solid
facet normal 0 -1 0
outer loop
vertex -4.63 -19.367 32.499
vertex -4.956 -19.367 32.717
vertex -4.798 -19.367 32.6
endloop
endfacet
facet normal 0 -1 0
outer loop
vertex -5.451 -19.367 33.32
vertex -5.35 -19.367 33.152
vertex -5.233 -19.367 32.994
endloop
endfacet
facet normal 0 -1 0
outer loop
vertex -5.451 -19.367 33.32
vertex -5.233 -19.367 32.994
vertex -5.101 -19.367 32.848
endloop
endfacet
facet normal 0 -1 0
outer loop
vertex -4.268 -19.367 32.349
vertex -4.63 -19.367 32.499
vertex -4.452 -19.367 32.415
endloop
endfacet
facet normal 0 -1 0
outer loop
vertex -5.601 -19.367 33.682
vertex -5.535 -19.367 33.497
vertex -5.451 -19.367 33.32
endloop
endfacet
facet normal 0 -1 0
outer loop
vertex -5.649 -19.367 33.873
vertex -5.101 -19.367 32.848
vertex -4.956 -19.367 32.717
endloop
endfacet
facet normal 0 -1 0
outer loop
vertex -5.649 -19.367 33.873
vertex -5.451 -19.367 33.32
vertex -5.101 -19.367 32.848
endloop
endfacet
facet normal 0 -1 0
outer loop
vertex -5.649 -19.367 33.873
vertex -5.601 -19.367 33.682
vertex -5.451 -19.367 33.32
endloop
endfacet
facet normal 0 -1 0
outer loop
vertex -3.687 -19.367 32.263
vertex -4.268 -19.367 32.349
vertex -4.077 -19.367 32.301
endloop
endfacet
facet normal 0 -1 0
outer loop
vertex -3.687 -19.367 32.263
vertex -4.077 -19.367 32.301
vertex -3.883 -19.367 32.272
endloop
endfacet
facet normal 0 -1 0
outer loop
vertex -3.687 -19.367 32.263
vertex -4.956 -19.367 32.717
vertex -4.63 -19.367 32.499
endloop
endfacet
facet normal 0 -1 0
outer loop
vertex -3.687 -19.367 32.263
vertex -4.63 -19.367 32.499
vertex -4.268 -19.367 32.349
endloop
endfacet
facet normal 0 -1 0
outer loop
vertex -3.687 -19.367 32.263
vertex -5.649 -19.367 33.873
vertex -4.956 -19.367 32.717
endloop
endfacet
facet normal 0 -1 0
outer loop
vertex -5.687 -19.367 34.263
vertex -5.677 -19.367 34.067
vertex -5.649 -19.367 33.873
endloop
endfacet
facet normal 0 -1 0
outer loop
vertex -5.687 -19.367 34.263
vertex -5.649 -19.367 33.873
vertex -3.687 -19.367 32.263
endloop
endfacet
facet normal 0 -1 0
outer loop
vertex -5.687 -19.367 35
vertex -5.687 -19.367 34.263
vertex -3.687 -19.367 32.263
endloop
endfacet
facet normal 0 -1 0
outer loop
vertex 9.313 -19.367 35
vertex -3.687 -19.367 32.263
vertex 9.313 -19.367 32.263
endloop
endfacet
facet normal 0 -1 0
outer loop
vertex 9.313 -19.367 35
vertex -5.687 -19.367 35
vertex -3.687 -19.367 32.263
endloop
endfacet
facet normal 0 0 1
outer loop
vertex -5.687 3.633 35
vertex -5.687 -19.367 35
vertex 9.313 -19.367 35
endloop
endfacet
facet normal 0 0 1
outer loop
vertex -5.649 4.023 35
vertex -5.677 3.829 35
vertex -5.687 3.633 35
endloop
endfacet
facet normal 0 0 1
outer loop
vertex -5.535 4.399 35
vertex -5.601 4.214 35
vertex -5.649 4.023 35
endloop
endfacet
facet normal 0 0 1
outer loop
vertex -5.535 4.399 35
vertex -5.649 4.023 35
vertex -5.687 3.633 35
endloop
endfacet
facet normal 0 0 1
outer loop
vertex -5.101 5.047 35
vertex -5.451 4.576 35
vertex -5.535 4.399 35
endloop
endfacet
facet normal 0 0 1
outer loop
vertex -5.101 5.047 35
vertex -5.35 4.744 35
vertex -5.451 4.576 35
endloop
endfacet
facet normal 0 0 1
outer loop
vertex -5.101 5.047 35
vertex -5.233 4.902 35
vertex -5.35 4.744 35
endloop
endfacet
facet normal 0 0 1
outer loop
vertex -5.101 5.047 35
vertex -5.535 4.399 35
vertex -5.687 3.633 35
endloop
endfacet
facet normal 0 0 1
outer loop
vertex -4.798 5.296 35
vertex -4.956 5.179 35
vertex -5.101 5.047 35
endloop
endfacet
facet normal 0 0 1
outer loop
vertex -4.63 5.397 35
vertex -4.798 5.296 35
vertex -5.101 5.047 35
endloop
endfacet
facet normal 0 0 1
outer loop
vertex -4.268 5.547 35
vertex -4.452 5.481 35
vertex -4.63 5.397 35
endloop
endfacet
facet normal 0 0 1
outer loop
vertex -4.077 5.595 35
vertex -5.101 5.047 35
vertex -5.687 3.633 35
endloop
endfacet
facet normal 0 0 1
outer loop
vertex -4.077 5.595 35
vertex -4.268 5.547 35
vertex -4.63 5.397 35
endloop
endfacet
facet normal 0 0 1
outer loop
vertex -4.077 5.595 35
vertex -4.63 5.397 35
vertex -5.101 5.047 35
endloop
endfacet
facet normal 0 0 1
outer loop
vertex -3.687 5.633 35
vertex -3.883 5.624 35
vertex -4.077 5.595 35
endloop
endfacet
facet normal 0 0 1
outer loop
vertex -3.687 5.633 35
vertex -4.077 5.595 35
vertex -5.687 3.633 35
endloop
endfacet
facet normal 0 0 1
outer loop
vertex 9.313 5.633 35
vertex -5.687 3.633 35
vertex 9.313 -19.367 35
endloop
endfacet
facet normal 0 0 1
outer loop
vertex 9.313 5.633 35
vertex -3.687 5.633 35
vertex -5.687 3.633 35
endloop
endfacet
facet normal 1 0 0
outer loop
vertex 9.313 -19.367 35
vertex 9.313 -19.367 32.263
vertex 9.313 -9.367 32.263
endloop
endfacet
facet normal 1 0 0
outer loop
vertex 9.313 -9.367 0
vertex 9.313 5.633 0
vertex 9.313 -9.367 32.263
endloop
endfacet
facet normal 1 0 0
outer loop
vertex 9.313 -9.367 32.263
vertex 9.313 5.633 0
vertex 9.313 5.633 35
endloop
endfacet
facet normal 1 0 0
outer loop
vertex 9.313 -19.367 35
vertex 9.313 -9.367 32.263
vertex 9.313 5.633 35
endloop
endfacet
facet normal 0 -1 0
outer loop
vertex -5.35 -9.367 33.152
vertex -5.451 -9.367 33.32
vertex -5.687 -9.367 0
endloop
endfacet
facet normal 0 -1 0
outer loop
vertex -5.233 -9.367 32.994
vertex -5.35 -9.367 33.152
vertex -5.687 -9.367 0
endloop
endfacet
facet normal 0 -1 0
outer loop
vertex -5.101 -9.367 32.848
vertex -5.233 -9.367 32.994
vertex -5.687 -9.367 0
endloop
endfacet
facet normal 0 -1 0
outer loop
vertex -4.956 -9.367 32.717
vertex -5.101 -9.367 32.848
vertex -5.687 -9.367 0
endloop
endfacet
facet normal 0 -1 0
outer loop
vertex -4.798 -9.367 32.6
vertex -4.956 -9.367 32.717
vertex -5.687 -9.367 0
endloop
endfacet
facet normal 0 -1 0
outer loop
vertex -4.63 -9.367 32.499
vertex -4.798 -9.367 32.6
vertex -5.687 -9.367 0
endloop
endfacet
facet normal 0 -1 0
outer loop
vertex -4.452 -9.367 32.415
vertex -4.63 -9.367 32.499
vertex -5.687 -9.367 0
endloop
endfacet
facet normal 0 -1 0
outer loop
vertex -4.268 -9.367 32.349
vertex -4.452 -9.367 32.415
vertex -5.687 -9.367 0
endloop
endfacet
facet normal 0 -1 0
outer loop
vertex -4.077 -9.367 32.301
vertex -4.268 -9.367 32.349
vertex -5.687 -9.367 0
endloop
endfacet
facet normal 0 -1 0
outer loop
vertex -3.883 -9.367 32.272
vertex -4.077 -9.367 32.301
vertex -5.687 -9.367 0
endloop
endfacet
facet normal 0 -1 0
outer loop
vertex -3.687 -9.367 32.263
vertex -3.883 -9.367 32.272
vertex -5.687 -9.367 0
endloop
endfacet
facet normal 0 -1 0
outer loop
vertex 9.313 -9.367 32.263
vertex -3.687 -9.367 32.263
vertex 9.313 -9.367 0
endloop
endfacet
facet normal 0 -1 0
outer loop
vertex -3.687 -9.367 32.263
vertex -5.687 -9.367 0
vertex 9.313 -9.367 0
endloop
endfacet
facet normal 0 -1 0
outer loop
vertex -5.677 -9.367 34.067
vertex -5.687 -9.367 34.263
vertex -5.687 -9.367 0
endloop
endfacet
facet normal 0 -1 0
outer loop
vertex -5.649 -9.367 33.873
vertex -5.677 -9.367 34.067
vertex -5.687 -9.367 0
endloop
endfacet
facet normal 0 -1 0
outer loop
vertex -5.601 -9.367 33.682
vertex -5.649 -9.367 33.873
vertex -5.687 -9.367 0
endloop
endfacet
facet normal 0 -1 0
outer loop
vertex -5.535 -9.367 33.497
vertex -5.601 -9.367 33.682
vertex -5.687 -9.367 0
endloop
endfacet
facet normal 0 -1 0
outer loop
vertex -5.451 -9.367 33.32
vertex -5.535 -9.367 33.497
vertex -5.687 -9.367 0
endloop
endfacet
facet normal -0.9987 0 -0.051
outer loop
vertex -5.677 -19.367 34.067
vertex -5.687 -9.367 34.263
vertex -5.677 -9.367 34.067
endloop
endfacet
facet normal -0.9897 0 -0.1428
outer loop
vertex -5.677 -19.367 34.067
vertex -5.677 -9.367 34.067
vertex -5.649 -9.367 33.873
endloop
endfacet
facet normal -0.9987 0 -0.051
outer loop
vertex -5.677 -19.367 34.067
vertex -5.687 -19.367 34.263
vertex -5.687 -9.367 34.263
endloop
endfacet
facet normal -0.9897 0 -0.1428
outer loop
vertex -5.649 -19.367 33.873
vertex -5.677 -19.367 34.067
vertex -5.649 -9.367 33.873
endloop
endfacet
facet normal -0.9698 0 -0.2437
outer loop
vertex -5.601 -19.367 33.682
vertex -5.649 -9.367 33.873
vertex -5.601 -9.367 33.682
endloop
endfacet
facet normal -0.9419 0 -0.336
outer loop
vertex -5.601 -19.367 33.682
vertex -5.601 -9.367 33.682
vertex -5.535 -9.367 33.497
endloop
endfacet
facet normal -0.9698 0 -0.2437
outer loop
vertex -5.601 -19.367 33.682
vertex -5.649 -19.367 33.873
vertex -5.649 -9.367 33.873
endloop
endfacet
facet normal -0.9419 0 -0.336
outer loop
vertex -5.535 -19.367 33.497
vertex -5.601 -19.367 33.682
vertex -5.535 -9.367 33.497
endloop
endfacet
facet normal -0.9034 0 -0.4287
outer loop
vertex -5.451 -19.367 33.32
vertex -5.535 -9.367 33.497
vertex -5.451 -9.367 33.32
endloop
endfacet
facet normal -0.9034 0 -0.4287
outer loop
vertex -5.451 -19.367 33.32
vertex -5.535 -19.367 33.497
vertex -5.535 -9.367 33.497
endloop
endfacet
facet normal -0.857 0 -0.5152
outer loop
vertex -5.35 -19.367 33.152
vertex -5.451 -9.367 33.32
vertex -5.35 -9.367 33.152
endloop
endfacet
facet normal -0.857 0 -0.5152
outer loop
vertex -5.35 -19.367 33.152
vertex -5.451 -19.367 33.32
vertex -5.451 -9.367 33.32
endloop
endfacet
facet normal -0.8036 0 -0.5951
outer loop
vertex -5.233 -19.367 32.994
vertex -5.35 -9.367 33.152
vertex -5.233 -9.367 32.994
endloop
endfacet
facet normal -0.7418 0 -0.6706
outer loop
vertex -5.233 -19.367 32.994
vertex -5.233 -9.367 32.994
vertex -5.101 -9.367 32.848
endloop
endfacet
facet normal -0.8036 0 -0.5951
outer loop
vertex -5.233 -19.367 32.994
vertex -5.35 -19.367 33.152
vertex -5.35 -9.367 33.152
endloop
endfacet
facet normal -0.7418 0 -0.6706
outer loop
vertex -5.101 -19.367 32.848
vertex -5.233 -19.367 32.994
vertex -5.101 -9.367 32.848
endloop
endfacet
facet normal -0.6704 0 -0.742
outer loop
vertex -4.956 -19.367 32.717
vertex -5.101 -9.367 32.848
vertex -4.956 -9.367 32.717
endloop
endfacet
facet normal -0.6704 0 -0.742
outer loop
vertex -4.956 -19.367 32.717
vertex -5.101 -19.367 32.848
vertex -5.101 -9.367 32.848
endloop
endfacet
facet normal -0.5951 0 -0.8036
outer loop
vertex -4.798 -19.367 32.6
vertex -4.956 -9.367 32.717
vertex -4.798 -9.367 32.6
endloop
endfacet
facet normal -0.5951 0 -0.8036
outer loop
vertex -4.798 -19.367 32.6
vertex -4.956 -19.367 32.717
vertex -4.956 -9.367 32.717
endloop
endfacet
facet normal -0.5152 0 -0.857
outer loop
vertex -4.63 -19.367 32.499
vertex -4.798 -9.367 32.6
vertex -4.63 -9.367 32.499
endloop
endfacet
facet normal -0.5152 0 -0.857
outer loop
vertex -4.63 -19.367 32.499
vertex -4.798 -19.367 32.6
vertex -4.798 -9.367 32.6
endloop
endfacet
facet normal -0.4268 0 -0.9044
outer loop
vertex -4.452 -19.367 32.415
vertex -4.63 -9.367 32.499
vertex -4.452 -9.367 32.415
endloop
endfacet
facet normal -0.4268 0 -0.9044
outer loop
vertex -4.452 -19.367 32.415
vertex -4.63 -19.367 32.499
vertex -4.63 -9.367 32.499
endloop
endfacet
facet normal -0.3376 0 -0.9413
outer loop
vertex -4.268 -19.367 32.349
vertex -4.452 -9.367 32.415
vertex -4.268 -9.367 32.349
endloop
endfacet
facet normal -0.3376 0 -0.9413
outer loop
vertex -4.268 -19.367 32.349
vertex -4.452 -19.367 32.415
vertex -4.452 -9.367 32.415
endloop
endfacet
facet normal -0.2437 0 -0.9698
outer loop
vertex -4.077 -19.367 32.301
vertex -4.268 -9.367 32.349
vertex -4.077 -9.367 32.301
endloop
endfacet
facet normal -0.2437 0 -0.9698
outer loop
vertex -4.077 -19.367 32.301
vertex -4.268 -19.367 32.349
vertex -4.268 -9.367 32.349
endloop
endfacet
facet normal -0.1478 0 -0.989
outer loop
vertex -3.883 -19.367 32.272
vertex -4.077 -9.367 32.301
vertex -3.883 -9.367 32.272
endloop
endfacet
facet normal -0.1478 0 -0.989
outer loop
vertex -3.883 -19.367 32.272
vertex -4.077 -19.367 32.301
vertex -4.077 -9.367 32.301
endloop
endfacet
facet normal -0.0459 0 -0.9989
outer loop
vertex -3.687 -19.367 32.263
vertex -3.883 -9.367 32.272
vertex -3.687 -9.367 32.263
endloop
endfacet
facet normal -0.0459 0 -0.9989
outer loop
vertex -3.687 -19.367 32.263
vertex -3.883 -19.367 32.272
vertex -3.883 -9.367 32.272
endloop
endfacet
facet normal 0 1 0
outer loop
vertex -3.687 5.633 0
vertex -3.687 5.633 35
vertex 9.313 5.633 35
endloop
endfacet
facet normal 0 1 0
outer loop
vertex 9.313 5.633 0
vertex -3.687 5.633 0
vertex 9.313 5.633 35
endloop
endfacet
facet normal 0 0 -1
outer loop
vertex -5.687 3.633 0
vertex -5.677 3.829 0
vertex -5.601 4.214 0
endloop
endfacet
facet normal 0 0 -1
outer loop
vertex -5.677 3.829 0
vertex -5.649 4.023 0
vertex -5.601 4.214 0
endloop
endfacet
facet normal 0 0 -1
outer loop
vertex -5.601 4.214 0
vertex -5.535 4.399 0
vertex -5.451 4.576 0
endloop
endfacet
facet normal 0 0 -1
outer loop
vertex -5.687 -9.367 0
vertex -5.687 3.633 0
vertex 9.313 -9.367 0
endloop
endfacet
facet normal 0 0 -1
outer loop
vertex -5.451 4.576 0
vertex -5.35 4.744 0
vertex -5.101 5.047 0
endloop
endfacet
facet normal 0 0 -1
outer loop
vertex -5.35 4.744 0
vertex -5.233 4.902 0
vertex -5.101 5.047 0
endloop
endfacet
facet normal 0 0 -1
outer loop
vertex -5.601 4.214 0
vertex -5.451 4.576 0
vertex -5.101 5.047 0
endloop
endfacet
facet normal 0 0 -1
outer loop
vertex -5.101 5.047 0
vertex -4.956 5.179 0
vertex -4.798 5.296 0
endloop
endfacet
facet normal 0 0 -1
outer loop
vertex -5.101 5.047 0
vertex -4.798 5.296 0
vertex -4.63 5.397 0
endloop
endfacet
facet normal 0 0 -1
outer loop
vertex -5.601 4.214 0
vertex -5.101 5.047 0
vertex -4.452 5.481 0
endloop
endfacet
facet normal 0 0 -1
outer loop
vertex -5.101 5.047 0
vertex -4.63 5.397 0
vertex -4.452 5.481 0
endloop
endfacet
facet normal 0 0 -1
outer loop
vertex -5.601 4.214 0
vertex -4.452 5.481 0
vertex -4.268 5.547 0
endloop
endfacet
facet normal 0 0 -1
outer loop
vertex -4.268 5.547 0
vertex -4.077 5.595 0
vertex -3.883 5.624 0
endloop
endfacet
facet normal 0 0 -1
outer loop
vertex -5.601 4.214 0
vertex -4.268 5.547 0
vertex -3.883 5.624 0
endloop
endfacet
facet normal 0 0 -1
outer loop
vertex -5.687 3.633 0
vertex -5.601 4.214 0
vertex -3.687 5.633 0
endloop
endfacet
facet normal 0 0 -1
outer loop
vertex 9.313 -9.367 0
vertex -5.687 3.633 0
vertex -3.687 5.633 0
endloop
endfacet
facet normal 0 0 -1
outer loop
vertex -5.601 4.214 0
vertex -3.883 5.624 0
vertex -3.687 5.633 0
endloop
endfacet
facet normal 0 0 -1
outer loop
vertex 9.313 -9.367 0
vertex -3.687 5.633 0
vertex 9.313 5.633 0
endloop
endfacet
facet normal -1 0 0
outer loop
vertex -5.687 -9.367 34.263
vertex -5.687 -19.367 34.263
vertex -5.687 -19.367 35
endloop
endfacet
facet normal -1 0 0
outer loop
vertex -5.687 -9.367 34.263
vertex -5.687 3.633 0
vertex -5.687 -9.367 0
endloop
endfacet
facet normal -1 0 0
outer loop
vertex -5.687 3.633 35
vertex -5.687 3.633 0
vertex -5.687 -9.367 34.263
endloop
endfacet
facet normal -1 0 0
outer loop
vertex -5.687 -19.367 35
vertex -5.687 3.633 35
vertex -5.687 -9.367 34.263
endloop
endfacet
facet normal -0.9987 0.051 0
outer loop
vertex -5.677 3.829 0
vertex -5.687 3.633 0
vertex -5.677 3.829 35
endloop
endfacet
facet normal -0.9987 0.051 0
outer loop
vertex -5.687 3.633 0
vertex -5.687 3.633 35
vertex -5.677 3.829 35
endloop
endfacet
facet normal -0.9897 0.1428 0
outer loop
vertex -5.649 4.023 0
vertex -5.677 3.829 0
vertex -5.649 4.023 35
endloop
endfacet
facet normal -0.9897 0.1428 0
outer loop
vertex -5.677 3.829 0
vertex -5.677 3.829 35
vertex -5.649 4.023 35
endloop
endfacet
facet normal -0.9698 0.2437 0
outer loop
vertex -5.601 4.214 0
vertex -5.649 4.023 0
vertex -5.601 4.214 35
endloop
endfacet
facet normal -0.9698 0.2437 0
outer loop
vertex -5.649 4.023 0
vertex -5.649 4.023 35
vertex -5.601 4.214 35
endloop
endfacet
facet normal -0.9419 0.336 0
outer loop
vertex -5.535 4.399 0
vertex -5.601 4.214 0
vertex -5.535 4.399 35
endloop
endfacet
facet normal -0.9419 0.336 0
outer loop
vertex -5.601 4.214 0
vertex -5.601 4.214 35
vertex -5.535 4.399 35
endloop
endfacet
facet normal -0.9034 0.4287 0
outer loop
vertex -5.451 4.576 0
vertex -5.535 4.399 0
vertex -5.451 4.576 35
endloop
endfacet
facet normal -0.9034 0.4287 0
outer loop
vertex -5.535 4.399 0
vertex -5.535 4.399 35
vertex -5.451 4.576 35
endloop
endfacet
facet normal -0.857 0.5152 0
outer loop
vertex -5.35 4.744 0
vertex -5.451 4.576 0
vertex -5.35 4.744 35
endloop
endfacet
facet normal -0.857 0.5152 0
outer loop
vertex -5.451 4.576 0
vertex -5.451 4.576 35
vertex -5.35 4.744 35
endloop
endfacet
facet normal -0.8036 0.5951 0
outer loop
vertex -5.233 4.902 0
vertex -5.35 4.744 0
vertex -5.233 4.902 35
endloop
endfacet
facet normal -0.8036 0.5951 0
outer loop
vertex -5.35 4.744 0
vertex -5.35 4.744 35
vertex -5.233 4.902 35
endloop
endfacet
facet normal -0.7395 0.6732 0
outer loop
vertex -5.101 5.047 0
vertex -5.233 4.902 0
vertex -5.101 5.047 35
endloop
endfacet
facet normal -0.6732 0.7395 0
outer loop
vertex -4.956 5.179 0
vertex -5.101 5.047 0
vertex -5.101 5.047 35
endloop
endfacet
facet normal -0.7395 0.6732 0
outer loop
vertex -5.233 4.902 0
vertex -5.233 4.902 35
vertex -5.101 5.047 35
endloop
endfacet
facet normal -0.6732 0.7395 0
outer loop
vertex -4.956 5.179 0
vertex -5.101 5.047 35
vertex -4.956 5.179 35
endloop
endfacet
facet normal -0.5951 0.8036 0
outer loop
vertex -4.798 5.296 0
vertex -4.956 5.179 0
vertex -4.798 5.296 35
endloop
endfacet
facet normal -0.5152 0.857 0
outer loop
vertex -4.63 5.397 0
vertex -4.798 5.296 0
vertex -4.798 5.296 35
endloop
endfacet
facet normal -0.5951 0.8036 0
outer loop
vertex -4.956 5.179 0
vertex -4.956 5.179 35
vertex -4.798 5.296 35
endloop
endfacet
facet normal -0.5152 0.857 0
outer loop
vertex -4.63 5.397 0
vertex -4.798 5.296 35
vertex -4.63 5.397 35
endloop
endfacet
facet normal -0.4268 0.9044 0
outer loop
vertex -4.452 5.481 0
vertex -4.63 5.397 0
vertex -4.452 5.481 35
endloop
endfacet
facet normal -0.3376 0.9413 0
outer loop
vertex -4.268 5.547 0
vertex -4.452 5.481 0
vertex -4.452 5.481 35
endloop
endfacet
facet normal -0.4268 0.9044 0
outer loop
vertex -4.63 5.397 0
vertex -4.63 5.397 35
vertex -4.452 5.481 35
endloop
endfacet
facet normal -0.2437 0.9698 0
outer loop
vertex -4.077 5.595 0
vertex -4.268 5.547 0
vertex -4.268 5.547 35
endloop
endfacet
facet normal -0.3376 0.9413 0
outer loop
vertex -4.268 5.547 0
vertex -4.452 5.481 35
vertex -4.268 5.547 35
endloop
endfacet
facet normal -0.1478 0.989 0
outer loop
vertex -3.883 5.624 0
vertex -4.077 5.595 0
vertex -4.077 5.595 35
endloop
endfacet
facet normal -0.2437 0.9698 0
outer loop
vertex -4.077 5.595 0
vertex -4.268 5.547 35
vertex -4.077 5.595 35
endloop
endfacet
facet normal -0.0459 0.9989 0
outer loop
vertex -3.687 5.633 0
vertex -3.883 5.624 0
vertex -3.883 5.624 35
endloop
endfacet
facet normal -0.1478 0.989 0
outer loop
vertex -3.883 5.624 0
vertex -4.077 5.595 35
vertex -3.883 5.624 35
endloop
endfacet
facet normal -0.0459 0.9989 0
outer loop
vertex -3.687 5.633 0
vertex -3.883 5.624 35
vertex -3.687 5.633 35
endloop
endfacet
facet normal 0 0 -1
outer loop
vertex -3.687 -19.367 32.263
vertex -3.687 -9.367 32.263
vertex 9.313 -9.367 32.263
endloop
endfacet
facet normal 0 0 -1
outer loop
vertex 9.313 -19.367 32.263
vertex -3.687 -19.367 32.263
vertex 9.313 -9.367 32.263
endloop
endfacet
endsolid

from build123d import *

# Parameters (mm, degrees)
F0_W     = 15
F0_H     = 15
F1_DEPTH = 35
F2_W     = 15
F2_H     = 2.73731336
F3_DEPTH = 10
F4_R     = 2
F5_R     = 2


with BuildPart() as f1:
    # F0 (on Top) → F1 (new body)
    with BuildSketch(Plane.XY):
        with Locations((1.8129660748, -1.8668582881)):
            Rectangle(F0_W, F0_H)
    extrude(amount=F1_DEPTH)

    # F2 (on face) → F3 (join)
    with BuildSketch(Plane.XZ.offset(9.3668582881)):
        with Locations((1.8129660748, 33.63134332)):
            Rectangle(F2_W, F2_H)
    extrude(amount=F3_DEPTH)

    # F4
    f4_edges = [f1.edges().sort_by_distance(p)[0] for p in [
        (-5.687034, 5.633142, 17.5),
    ]]
    fillet(f4_edges, radius=F4_R)

    # F5
    f5_edges = [f1.edges().sort_by_distance(p)[0] for p in [
        (-5.687034, -14.366858, 32.262687),
    ]]
    fillet(f5_edges, radius=F5_R)


solid = f1.part
